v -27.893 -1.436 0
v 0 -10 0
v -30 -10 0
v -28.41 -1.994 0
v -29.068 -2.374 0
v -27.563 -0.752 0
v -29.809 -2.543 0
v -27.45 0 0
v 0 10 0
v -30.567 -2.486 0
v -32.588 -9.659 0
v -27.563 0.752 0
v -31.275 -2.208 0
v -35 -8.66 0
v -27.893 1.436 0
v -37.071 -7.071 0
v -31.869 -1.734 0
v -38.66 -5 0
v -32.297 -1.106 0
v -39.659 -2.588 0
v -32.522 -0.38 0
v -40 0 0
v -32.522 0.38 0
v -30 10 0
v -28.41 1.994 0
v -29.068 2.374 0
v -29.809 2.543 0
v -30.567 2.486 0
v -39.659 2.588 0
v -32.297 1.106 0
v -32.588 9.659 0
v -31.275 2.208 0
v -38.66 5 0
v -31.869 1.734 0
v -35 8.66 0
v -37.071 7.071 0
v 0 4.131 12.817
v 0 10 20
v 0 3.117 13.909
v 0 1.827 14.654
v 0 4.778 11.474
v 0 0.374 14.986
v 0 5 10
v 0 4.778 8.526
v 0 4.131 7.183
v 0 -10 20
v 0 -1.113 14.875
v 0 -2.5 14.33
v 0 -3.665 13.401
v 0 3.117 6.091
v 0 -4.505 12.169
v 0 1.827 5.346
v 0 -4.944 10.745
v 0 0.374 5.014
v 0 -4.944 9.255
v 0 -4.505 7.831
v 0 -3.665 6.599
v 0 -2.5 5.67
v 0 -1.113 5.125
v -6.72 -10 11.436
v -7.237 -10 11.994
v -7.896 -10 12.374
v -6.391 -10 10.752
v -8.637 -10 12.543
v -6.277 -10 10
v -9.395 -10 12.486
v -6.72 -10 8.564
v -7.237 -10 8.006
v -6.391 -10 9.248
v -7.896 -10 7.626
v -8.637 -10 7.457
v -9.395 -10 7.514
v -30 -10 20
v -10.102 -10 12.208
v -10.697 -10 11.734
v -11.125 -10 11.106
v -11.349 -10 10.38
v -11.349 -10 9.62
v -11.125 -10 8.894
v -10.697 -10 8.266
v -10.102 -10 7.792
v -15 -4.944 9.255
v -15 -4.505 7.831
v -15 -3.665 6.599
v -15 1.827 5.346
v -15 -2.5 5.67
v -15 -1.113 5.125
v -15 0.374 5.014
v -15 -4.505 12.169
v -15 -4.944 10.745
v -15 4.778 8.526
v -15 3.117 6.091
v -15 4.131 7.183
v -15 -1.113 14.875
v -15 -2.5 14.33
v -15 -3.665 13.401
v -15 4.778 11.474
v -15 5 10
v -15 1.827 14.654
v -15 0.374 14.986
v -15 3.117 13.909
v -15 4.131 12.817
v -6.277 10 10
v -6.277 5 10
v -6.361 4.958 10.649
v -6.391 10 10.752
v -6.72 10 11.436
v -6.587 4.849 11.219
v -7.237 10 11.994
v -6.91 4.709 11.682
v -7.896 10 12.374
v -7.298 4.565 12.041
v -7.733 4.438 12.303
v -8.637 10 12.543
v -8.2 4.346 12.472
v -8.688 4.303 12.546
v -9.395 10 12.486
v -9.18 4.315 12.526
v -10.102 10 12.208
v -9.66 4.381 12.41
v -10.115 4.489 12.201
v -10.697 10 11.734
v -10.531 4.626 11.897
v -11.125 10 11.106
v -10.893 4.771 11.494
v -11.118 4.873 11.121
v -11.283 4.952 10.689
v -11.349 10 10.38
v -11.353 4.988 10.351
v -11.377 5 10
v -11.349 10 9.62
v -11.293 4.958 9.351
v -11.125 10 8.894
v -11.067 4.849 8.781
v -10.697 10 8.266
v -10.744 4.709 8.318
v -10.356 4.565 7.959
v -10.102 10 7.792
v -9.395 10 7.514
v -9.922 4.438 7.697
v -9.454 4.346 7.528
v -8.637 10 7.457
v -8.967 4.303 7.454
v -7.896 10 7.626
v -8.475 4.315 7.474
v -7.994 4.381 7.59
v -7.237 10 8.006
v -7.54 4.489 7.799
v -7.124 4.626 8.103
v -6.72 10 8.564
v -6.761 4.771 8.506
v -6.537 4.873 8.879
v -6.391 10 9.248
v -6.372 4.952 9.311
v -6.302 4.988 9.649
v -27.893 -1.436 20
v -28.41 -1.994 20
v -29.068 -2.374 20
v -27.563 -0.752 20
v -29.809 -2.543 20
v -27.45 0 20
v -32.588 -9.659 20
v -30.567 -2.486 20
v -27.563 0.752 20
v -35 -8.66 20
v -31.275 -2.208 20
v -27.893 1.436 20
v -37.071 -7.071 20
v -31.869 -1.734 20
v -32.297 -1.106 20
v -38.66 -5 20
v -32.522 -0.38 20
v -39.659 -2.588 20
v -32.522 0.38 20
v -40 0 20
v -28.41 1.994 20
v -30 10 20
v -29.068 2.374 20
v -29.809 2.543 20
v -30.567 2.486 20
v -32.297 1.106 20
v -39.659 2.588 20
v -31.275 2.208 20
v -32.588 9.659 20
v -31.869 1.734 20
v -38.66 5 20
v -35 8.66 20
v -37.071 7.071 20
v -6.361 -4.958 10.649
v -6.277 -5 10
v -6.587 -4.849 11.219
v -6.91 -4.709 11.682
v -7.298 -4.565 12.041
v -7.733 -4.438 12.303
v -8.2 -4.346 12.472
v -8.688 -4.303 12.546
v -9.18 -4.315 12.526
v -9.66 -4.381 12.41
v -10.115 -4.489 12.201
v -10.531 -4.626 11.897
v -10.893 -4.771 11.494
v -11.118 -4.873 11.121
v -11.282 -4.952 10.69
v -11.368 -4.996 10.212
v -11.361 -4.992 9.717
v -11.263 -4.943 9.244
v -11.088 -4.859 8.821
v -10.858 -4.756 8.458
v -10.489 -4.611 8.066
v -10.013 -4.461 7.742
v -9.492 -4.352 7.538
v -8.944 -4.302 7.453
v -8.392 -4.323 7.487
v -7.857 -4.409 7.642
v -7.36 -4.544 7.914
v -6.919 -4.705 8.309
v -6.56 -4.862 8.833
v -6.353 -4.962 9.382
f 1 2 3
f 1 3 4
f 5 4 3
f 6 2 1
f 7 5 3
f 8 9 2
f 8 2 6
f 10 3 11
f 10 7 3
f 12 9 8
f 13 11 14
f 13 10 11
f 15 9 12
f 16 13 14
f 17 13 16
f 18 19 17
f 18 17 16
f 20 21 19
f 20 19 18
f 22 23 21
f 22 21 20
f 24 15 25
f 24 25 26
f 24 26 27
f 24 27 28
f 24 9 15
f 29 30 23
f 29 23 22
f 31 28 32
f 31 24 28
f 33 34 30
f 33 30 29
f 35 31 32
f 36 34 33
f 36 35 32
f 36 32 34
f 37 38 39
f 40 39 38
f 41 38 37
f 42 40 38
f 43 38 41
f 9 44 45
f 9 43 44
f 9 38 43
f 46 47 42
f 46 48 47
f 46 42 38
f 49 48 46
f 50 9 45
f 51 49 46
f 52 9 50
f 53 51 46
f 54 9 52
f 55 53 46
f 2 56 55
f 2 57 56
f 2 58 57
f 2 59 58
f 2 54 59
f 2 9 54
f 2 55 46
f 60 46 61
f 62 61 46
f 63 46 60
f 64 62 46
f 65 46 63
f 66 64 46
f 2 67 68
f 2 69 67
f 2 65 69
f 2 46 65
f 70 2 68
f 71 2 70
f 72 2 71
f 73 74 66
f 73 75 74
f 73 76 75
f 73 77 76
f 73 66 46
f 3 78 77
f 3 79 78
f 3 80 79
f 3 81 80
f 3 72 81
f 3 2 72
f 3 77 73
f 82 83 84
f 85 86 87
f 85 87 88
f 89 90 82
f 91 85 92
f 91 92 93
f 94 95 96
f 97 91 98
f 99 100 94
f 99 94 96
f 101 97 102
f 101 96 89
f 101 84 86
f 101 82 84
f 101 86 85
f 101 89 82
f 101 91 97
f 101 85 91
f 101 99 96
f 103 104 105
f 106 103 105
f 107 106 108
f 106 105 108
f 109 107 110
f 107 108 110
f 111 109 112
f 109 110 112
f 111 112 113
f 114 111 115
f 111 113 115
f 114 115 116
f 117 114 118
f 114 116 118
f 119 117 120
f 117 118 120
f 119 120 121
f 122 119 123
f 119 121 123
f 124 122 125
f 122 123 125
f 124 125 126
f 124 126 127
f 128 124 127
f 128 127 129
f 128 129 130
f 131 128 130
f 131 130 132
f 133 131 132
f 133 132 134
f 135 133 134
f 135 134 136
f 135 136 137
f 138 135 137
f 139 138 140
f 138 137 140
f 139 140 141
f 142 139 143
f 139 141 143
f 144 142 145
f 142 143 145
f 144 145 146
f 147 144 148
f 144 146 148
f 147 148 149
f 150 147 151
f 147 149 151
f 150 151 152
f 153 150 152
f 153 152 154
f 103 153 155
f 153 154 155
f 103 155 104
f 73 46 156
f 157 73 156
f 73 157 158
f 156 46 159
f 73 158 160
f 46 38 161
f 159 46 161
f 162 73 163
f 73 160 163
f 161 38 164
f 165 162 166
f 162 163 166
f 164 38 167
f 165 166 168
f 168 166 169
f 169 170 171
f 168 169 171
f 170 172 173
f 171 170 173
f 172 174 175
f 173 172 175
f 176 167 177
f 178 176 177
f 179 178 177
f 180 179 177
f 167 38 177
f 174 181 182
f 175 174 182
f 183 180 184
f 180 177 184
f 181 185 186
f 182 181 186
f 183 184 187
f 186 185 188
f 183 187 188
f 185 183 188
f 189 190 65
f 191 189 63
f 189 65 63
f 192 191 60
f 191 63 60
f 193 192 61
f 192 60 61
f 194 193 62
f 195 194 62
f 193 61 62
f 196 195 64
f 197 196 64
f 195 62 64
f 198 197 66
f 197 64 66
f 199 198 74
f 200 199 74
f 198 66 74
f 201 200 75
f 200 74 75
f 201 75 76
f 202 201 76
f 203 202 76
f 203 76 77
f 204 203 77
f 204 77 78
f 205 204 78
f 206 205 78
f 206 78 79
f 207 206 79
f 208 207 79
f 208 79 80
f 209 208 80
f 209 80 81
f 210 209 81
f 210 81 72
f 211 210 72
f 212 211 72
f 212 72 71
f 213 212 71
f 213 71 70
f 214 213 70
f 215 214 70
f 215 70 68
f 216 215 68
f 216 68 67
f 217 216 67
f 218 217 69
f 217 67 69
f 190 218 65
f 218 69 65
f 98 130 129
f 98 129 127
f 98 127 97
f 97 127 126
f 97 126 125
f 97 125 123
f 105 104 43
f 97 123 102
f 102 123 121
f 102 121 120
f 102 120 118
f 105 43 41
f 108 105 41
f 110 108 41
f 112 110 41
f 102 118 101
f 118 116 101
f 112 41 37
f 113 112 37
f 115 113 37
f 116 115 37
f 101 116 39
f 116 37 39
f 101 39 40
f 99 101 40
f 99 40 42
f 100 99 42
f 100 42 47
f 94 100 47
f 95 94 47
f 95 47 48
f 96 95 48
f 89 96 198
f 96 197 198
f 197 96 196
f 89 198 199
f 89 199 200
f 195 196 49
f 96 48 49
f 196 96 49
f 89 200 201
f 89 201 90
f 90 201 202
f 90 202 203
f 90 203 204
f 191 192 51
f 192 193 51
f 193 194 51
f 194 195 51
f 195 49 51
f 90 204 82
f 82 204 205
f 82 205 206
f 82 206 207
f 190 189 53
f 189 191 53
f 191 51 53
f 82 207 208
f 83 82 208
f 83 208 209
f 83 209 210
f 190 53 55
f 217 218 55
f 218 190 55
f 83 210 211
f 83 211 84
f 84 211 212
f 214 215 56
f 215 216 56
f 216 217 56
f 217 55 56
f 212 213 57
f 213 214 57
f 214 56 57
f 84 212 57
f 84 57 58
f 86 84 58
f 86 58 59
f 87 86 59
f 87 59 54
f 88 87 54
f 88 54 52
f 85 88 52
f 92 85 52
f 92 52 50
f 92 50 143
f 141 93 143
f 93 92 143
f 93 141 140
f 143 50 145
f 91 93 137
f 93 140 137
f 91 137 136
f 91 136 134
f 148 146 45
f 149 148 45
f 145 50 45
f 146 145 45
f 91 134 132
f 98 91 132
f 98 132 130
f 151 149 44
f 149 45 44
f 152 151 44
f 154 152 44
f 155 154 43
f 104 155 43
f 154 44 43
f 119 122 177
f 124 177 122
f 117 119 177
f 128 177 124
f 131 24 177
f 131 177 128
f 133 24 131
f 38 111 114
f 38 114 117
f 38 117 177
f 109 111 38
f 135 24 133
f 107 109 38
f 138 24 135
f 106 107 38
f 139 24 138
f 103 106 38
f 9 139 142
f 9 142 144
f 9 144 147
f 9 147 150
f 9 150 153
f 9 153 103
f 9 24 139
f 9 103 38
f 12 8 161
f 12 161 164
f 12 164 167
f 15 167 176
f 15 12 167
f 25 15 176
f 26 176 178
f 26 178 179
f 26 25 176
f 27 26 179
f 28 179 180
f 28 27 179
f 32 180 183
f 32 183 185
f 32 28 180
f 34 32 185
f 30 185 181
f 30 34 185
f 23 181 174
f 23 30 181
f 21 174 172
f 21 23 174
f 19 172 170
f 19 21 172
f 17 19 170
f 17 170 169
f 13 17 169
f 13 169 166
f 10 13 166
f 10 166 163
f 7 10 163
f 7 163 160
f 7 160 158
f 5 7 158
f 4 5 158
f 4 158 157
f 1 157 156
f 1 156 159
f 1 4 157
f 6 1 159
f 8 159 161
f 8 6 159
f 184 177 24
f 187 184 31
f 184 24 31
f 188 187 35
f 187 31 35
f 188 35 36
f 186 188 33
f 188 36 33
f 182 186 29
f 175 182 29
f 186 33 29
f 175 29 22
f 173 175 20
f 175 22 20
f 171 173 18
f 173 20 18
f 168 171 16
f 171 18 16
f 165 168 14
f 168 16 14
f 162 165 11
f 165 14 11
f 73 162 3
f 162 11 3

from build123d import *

# Parameters (mm, degrees)
SKETCH_R        = 2.55
PAD_DEPTH       = 20
SKETCH001_R     = 5
POCKET_DEPTH    = 15
SKETCH003_R     = 2.55
POCKET001_DEPTH = 20.001


with BuildPart() as part:
    # Sketch → Pad (new body)
    with BuildSketch(Plane.XY):
        with BuildLine():
            Line((-30, 10), (0, 10))
            Line((0, 10), (0, -10))
            Line((0, -10), (-30, -10))
            ThreePointArc((-30, 10), (-40, 0), (-30, -10))
        make_face()
        with Locations((-30, 0)):
            Circle(SKETCH_R, mode=Mode.SUBTRACT)
    extrude(amount=PAD_DEPTH)

    # Sketch001 (on Face2 of Pad) → Pocket (cut)
    with BuildSketch(Plane.YZ):
        with Locations((0, 10)):
            Circle(SKETCH001_R)
    extrude(amount=-POCKET_DEPTH, mode=Mode.SUBTRACT)

    # Sketch003 (on Face6 of Pocket) → Pocket001 (cut, through all)
    with BuildSketch(Plane.XZ.offset(10)):
        with Locations((-8.827239, 10)):
            Circle(SKETCH003_R)
    extrude(amount=-POCKET001_DEPTH, mode=Mode.SUBTRACT)


solid = part.part
